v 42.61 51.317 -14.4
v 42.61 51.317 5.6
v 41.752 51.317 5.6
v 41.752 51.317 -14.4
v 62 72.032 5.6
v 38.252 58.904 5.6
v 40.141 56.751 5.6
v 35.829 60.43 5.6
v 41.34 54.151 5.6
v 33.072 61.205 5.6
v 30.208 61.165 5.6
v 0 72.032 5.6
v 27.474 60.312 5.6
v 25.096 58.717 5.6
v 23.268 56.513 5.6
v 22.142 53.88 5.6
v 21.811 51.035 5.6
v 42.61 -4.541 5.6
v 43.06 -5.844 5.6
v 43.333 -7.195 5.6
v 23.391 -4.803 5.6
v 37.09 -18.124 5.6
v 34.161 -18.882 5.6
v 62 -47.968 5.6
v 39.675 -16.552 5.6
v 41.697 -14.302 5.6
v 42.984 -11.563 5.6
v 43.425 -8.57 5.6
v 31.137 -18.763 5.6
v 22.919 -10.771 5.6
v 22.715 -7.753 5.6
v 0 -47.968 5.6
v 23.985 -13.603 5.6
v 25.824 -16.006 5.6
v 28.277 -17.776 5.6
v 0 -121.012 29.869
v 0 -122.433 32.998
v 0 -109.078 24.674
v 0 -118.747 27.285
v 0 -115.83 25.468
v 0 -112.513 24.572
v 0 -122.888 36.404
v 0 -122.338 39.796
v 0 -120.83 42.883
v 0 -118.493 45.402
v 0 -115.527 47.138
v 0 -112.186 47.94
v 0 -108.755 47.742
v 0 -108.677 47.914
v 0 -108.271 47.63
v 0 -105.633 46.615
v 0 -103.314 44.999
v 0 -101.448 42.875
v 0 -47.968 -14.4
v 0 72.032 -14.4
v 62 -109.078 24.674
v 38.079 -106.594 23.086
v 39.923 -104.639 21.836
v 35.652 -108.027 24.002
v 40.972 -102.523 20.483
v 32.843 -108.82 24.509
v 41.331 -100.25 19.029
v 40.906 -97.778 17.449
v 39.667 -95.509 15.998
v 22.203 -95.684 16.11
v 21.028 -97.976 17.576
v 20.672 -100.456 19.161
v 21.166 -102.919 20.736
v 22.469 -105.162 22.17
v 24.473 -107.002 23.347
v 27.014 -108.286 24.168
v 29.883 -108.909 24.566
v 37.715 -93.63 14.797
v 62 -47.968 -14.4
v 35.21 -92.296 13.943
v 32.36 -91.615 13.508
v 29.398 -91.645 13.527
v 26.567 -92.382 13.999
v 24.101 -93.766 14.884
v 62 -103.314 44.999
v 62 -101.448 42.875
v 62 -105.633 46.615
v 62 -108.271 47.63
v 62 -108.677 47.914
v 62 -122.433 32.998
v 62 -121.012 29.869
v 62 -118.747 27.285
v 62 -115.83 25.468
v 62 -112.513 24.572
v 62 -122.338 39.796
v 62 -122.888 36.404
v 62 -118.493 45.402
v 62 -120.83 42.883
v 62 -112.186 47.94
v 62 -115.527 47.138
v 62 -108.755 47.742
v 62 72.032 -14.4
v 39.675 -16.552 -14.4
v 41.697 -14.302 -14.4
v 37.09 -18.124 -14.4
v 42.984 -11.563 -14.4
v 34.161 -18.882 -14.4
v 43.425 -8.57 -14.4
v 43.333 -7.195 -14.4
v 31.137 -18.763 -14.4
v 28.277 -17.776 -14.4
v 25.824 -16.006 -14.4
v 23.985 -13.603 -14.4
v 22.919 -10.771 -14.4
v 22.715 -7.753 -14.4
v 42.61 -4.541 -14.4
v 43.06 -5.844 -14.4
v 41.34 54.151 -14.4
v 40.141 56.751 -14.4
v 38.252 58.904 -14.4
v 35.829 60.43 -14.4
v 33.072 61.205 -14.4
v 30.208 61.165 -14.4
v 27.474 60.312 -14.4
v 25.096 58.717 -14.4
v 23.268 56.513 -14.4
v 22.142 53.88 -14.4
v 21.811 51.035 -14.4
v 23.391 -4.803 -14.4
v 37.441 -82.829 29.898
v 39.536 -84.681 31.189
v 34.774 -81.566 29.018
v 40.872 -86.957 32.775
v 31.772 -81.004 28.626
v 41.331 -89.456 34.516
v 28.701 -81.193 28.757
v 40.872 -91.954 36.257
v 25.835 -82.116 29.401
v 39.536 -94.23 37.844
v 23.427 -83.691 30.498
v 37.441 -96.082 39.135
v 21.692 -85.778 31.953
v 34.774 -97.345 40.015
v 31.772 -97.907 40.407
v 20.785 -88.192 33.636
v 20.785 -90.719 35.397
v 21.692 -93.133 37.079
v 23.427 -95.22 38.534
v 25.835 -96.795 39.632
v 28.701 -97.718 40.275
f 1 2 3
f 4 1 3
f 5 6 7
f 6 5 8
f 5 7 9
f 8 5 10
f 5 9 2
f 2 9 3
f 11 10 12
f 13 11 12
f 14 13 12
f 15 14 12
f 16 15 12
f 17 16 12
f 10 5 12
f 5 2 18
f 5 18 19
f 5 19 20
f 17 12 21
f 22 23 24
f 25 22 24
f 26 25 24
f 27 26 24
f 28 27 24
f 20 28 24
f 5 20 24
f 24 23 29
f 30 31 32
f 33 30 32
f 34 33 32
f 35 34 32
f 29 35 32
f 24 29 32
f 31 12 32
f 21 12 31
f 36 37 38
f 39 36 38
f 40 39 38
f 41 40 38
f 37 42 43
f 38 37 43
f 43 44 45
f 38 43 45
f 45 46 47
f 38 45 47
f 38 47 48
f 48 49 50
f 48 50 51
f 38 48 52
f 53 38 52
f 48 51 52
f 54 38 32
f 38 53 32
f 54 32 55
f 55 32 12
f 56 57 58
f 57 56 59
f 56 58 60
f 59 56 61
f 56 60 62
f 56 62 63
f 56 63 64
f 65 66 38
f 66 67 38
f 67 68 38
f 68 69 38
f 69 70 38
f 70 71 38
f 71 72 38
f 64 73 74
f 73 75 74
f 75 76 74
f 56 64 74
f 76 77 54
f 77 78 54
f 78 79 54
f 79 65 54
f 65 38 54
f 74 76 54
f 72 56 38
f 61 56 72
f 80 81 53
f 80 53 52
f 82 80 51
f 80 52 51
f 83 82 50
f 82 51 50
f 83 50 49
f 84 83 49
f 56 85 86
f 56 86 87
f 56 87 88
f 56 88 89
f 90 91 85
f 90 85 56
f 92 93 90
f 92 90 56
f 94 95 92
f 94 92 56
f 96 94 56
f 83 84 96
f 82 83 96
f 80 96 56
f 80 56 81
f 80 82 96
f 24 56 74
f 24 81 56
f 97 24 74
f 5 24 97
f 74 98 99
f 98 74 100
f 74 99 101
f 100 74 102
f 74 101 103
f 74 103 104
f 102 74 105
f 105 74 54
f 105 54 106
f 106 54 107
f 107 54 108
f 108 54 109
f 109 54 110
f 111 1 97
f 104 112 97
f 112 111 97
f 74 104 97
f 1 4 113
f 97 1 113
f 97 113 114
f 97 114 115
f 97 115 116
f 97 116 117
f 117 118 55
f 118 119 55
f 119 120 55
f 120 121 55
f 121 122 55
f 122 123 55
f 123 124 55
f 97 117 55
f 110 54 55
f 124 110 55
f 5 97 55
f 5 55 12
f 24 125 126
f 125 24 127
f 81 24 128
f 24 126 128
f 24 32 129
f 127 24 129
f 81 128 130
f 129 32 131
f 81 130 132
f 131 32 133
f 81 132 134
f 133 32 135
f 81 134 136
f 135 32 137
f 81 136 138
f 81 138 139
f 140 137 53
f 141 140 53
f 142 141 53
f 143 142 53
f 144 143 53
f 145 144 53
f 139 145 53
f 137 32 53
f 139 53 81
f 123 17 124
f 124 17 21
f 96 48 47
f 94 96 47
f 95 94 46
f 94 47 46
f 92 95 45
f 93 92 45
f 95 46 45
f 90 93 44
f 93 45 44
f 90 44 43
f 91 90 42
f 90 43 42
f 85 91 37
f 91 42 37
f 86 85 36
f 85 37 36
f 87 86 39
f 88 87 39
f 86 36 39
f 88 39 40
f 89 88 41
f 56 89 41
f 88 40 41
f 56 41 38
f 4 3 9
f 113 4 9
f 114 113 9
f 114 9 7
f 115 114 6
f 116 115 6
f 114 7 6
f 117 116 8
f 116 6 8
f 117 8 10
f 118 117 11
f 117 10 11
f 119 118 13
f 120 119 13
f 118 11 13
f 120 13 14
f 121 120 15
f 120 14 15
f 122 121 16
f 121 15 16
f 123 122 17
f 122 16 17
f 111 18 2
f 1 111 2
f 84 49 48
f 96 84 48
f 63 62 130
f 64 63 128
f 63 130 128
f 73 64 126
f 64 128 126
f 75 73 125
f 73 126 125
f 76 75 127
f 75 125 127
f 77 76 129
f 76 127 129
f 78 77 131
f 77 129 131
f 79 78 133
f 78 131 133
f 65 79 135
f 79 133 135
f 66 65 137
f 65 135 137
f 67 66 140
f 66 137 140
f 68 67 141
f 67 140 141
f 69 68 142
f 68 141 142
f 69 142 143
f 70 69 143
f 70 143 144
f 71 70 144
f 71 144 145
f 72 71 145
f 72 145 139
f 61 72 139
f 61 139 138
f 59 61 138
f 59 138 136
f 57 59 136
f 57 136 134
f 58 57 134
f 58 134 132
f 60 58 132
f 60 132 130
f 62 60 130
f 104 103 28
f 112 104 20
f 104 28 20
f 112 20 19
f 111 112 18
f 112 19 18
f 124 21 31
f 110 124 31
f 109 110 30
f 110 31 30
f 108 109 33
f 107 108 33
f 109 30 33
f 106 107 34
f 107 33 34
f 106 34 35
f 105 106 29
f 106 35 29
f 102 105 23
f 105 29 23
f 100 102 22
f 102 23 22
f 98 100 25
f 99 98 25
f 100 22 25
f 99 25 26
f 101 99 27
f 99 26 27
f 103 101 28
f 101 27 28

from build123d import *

# Parameters (mm, degrees)
F1_DEPTH = 62
F2_R     = 11.7474696308
F3_DEPTH = 62
F5_DEPTH = 62
F6_R     = 10.330572445
F7_DEPTH = 62


with BuildPart() as f1:
    # F0 (on Right) → F1 (new body)
    with BuildSketch(Plane.YZ):
        Polygon((72.0315793902, 5.5999404844), (-47.9684206098, 5.5999404844), (-47.9684206098, -14.4000595156), (72.0315793902, -14.4000595156), (72.0315793902, -4.4000595156), align=None)
        Polygon((-47.9684206098, -14.4000595156), (-47.9684206098, 5.5999404844), (-108.6771392604, 47.9136673329), (-116.9353204182, 29.6982221294), align=None)
    extrude(amount=F1_DEPTH)

    # F2 (on Right) → F3 (join)
    with BuildSketch(Plane.YZ):
        with Locations((-111.1419275403, 36.2391285598)):
            Circle(F2_R)
    extrude(amount=F3_DEPTH)

    # F4 (on face) → F5 (cut)
    with BuildSketch(Plane.XY.offset(5.5999404844)):
        with BuildLine():
            ThreePointArc((21.8113110218, 51.0349926195), (31.9204424494, 41.3457998855), (41.7515892409, 51.316935569))
            ThreePointArc((41.7515892409, 51.316935569), (31.6384713179, 61.2880712526), (21.8113110218, 51.0349926195))
        make_face()
        with BuildLine():
            Line((42.6100902259, 51.316935569), (41.7515892409, 51.316935569))
            ThreePointArc((41.7515892409, 51.316935569), (31.9204424494, 41.3457998855), (21.8113110218, 51.0349926195))
            Line((21.8113110218, 51.0349926195), (23.3906661796, -4.8034051943))
            ThreePointArc((23.3906661796, -4.8034051943), (32.9119310697, 1.8000949809), (42.6100902259, -4.540757379))
            Line((42.6100902259, -4.540757379), (42.6100902259, 51.316935569))
        make_face()
        with BuildLine():
            ThreePointArc((43.4248242139, -8.5701132193), (43.2191003354, -6.5146631494), (42.6100902259, -4.540757379))
            Line((42.6100902259, -4.540757379), (42.6100902259, -8.5701132193))
            Line((42.6100902259, -8.5701132193), (23.4972052276, -8.5701132193))
            Line((23.4972052276, -8.5701132193), (23.3906661796, -4.8034051943))
            ThreePointArc((23.3906661796, -4.8034051943), (31.1372951092, -18.7627033893), (43.4248242139, -8.5701132193))
        make_face()
        with BuildLine():
            Line((42.6100902259, -8.5701132193), (42.6100902259, -4.540757379))
            ThreePointArc((42.6100902259, -4.540757379), (32.9119310697, 1.8000949809), (23.3906661796, -4.8034051943))
            Line((23.3906661796, -4.8034051943), (23.4972052276, -8.5701132193))
            Line((23.4972052276, -8.5701132193), (42.6100902259, -8.5701132193))
        make_face()
    extrude(amount=-F5_DEPTH, mode=Mode.SUBTRACT)

    # F6 (on face) → F7 (cut)
    with BuildSketch(Plane(origin=(0, -13.0569639472, -18.7332010139), x_dir=(1, 0, 0), z_dir=(0, 0.5718071196, 0.8203880899))):
        with Locations((31, -93.1249111891)):
            Circle(F6_R)
    extrude(amount=-F7_DEPTH, mode=Mode.SUBTRACT)


solid = f1.part
